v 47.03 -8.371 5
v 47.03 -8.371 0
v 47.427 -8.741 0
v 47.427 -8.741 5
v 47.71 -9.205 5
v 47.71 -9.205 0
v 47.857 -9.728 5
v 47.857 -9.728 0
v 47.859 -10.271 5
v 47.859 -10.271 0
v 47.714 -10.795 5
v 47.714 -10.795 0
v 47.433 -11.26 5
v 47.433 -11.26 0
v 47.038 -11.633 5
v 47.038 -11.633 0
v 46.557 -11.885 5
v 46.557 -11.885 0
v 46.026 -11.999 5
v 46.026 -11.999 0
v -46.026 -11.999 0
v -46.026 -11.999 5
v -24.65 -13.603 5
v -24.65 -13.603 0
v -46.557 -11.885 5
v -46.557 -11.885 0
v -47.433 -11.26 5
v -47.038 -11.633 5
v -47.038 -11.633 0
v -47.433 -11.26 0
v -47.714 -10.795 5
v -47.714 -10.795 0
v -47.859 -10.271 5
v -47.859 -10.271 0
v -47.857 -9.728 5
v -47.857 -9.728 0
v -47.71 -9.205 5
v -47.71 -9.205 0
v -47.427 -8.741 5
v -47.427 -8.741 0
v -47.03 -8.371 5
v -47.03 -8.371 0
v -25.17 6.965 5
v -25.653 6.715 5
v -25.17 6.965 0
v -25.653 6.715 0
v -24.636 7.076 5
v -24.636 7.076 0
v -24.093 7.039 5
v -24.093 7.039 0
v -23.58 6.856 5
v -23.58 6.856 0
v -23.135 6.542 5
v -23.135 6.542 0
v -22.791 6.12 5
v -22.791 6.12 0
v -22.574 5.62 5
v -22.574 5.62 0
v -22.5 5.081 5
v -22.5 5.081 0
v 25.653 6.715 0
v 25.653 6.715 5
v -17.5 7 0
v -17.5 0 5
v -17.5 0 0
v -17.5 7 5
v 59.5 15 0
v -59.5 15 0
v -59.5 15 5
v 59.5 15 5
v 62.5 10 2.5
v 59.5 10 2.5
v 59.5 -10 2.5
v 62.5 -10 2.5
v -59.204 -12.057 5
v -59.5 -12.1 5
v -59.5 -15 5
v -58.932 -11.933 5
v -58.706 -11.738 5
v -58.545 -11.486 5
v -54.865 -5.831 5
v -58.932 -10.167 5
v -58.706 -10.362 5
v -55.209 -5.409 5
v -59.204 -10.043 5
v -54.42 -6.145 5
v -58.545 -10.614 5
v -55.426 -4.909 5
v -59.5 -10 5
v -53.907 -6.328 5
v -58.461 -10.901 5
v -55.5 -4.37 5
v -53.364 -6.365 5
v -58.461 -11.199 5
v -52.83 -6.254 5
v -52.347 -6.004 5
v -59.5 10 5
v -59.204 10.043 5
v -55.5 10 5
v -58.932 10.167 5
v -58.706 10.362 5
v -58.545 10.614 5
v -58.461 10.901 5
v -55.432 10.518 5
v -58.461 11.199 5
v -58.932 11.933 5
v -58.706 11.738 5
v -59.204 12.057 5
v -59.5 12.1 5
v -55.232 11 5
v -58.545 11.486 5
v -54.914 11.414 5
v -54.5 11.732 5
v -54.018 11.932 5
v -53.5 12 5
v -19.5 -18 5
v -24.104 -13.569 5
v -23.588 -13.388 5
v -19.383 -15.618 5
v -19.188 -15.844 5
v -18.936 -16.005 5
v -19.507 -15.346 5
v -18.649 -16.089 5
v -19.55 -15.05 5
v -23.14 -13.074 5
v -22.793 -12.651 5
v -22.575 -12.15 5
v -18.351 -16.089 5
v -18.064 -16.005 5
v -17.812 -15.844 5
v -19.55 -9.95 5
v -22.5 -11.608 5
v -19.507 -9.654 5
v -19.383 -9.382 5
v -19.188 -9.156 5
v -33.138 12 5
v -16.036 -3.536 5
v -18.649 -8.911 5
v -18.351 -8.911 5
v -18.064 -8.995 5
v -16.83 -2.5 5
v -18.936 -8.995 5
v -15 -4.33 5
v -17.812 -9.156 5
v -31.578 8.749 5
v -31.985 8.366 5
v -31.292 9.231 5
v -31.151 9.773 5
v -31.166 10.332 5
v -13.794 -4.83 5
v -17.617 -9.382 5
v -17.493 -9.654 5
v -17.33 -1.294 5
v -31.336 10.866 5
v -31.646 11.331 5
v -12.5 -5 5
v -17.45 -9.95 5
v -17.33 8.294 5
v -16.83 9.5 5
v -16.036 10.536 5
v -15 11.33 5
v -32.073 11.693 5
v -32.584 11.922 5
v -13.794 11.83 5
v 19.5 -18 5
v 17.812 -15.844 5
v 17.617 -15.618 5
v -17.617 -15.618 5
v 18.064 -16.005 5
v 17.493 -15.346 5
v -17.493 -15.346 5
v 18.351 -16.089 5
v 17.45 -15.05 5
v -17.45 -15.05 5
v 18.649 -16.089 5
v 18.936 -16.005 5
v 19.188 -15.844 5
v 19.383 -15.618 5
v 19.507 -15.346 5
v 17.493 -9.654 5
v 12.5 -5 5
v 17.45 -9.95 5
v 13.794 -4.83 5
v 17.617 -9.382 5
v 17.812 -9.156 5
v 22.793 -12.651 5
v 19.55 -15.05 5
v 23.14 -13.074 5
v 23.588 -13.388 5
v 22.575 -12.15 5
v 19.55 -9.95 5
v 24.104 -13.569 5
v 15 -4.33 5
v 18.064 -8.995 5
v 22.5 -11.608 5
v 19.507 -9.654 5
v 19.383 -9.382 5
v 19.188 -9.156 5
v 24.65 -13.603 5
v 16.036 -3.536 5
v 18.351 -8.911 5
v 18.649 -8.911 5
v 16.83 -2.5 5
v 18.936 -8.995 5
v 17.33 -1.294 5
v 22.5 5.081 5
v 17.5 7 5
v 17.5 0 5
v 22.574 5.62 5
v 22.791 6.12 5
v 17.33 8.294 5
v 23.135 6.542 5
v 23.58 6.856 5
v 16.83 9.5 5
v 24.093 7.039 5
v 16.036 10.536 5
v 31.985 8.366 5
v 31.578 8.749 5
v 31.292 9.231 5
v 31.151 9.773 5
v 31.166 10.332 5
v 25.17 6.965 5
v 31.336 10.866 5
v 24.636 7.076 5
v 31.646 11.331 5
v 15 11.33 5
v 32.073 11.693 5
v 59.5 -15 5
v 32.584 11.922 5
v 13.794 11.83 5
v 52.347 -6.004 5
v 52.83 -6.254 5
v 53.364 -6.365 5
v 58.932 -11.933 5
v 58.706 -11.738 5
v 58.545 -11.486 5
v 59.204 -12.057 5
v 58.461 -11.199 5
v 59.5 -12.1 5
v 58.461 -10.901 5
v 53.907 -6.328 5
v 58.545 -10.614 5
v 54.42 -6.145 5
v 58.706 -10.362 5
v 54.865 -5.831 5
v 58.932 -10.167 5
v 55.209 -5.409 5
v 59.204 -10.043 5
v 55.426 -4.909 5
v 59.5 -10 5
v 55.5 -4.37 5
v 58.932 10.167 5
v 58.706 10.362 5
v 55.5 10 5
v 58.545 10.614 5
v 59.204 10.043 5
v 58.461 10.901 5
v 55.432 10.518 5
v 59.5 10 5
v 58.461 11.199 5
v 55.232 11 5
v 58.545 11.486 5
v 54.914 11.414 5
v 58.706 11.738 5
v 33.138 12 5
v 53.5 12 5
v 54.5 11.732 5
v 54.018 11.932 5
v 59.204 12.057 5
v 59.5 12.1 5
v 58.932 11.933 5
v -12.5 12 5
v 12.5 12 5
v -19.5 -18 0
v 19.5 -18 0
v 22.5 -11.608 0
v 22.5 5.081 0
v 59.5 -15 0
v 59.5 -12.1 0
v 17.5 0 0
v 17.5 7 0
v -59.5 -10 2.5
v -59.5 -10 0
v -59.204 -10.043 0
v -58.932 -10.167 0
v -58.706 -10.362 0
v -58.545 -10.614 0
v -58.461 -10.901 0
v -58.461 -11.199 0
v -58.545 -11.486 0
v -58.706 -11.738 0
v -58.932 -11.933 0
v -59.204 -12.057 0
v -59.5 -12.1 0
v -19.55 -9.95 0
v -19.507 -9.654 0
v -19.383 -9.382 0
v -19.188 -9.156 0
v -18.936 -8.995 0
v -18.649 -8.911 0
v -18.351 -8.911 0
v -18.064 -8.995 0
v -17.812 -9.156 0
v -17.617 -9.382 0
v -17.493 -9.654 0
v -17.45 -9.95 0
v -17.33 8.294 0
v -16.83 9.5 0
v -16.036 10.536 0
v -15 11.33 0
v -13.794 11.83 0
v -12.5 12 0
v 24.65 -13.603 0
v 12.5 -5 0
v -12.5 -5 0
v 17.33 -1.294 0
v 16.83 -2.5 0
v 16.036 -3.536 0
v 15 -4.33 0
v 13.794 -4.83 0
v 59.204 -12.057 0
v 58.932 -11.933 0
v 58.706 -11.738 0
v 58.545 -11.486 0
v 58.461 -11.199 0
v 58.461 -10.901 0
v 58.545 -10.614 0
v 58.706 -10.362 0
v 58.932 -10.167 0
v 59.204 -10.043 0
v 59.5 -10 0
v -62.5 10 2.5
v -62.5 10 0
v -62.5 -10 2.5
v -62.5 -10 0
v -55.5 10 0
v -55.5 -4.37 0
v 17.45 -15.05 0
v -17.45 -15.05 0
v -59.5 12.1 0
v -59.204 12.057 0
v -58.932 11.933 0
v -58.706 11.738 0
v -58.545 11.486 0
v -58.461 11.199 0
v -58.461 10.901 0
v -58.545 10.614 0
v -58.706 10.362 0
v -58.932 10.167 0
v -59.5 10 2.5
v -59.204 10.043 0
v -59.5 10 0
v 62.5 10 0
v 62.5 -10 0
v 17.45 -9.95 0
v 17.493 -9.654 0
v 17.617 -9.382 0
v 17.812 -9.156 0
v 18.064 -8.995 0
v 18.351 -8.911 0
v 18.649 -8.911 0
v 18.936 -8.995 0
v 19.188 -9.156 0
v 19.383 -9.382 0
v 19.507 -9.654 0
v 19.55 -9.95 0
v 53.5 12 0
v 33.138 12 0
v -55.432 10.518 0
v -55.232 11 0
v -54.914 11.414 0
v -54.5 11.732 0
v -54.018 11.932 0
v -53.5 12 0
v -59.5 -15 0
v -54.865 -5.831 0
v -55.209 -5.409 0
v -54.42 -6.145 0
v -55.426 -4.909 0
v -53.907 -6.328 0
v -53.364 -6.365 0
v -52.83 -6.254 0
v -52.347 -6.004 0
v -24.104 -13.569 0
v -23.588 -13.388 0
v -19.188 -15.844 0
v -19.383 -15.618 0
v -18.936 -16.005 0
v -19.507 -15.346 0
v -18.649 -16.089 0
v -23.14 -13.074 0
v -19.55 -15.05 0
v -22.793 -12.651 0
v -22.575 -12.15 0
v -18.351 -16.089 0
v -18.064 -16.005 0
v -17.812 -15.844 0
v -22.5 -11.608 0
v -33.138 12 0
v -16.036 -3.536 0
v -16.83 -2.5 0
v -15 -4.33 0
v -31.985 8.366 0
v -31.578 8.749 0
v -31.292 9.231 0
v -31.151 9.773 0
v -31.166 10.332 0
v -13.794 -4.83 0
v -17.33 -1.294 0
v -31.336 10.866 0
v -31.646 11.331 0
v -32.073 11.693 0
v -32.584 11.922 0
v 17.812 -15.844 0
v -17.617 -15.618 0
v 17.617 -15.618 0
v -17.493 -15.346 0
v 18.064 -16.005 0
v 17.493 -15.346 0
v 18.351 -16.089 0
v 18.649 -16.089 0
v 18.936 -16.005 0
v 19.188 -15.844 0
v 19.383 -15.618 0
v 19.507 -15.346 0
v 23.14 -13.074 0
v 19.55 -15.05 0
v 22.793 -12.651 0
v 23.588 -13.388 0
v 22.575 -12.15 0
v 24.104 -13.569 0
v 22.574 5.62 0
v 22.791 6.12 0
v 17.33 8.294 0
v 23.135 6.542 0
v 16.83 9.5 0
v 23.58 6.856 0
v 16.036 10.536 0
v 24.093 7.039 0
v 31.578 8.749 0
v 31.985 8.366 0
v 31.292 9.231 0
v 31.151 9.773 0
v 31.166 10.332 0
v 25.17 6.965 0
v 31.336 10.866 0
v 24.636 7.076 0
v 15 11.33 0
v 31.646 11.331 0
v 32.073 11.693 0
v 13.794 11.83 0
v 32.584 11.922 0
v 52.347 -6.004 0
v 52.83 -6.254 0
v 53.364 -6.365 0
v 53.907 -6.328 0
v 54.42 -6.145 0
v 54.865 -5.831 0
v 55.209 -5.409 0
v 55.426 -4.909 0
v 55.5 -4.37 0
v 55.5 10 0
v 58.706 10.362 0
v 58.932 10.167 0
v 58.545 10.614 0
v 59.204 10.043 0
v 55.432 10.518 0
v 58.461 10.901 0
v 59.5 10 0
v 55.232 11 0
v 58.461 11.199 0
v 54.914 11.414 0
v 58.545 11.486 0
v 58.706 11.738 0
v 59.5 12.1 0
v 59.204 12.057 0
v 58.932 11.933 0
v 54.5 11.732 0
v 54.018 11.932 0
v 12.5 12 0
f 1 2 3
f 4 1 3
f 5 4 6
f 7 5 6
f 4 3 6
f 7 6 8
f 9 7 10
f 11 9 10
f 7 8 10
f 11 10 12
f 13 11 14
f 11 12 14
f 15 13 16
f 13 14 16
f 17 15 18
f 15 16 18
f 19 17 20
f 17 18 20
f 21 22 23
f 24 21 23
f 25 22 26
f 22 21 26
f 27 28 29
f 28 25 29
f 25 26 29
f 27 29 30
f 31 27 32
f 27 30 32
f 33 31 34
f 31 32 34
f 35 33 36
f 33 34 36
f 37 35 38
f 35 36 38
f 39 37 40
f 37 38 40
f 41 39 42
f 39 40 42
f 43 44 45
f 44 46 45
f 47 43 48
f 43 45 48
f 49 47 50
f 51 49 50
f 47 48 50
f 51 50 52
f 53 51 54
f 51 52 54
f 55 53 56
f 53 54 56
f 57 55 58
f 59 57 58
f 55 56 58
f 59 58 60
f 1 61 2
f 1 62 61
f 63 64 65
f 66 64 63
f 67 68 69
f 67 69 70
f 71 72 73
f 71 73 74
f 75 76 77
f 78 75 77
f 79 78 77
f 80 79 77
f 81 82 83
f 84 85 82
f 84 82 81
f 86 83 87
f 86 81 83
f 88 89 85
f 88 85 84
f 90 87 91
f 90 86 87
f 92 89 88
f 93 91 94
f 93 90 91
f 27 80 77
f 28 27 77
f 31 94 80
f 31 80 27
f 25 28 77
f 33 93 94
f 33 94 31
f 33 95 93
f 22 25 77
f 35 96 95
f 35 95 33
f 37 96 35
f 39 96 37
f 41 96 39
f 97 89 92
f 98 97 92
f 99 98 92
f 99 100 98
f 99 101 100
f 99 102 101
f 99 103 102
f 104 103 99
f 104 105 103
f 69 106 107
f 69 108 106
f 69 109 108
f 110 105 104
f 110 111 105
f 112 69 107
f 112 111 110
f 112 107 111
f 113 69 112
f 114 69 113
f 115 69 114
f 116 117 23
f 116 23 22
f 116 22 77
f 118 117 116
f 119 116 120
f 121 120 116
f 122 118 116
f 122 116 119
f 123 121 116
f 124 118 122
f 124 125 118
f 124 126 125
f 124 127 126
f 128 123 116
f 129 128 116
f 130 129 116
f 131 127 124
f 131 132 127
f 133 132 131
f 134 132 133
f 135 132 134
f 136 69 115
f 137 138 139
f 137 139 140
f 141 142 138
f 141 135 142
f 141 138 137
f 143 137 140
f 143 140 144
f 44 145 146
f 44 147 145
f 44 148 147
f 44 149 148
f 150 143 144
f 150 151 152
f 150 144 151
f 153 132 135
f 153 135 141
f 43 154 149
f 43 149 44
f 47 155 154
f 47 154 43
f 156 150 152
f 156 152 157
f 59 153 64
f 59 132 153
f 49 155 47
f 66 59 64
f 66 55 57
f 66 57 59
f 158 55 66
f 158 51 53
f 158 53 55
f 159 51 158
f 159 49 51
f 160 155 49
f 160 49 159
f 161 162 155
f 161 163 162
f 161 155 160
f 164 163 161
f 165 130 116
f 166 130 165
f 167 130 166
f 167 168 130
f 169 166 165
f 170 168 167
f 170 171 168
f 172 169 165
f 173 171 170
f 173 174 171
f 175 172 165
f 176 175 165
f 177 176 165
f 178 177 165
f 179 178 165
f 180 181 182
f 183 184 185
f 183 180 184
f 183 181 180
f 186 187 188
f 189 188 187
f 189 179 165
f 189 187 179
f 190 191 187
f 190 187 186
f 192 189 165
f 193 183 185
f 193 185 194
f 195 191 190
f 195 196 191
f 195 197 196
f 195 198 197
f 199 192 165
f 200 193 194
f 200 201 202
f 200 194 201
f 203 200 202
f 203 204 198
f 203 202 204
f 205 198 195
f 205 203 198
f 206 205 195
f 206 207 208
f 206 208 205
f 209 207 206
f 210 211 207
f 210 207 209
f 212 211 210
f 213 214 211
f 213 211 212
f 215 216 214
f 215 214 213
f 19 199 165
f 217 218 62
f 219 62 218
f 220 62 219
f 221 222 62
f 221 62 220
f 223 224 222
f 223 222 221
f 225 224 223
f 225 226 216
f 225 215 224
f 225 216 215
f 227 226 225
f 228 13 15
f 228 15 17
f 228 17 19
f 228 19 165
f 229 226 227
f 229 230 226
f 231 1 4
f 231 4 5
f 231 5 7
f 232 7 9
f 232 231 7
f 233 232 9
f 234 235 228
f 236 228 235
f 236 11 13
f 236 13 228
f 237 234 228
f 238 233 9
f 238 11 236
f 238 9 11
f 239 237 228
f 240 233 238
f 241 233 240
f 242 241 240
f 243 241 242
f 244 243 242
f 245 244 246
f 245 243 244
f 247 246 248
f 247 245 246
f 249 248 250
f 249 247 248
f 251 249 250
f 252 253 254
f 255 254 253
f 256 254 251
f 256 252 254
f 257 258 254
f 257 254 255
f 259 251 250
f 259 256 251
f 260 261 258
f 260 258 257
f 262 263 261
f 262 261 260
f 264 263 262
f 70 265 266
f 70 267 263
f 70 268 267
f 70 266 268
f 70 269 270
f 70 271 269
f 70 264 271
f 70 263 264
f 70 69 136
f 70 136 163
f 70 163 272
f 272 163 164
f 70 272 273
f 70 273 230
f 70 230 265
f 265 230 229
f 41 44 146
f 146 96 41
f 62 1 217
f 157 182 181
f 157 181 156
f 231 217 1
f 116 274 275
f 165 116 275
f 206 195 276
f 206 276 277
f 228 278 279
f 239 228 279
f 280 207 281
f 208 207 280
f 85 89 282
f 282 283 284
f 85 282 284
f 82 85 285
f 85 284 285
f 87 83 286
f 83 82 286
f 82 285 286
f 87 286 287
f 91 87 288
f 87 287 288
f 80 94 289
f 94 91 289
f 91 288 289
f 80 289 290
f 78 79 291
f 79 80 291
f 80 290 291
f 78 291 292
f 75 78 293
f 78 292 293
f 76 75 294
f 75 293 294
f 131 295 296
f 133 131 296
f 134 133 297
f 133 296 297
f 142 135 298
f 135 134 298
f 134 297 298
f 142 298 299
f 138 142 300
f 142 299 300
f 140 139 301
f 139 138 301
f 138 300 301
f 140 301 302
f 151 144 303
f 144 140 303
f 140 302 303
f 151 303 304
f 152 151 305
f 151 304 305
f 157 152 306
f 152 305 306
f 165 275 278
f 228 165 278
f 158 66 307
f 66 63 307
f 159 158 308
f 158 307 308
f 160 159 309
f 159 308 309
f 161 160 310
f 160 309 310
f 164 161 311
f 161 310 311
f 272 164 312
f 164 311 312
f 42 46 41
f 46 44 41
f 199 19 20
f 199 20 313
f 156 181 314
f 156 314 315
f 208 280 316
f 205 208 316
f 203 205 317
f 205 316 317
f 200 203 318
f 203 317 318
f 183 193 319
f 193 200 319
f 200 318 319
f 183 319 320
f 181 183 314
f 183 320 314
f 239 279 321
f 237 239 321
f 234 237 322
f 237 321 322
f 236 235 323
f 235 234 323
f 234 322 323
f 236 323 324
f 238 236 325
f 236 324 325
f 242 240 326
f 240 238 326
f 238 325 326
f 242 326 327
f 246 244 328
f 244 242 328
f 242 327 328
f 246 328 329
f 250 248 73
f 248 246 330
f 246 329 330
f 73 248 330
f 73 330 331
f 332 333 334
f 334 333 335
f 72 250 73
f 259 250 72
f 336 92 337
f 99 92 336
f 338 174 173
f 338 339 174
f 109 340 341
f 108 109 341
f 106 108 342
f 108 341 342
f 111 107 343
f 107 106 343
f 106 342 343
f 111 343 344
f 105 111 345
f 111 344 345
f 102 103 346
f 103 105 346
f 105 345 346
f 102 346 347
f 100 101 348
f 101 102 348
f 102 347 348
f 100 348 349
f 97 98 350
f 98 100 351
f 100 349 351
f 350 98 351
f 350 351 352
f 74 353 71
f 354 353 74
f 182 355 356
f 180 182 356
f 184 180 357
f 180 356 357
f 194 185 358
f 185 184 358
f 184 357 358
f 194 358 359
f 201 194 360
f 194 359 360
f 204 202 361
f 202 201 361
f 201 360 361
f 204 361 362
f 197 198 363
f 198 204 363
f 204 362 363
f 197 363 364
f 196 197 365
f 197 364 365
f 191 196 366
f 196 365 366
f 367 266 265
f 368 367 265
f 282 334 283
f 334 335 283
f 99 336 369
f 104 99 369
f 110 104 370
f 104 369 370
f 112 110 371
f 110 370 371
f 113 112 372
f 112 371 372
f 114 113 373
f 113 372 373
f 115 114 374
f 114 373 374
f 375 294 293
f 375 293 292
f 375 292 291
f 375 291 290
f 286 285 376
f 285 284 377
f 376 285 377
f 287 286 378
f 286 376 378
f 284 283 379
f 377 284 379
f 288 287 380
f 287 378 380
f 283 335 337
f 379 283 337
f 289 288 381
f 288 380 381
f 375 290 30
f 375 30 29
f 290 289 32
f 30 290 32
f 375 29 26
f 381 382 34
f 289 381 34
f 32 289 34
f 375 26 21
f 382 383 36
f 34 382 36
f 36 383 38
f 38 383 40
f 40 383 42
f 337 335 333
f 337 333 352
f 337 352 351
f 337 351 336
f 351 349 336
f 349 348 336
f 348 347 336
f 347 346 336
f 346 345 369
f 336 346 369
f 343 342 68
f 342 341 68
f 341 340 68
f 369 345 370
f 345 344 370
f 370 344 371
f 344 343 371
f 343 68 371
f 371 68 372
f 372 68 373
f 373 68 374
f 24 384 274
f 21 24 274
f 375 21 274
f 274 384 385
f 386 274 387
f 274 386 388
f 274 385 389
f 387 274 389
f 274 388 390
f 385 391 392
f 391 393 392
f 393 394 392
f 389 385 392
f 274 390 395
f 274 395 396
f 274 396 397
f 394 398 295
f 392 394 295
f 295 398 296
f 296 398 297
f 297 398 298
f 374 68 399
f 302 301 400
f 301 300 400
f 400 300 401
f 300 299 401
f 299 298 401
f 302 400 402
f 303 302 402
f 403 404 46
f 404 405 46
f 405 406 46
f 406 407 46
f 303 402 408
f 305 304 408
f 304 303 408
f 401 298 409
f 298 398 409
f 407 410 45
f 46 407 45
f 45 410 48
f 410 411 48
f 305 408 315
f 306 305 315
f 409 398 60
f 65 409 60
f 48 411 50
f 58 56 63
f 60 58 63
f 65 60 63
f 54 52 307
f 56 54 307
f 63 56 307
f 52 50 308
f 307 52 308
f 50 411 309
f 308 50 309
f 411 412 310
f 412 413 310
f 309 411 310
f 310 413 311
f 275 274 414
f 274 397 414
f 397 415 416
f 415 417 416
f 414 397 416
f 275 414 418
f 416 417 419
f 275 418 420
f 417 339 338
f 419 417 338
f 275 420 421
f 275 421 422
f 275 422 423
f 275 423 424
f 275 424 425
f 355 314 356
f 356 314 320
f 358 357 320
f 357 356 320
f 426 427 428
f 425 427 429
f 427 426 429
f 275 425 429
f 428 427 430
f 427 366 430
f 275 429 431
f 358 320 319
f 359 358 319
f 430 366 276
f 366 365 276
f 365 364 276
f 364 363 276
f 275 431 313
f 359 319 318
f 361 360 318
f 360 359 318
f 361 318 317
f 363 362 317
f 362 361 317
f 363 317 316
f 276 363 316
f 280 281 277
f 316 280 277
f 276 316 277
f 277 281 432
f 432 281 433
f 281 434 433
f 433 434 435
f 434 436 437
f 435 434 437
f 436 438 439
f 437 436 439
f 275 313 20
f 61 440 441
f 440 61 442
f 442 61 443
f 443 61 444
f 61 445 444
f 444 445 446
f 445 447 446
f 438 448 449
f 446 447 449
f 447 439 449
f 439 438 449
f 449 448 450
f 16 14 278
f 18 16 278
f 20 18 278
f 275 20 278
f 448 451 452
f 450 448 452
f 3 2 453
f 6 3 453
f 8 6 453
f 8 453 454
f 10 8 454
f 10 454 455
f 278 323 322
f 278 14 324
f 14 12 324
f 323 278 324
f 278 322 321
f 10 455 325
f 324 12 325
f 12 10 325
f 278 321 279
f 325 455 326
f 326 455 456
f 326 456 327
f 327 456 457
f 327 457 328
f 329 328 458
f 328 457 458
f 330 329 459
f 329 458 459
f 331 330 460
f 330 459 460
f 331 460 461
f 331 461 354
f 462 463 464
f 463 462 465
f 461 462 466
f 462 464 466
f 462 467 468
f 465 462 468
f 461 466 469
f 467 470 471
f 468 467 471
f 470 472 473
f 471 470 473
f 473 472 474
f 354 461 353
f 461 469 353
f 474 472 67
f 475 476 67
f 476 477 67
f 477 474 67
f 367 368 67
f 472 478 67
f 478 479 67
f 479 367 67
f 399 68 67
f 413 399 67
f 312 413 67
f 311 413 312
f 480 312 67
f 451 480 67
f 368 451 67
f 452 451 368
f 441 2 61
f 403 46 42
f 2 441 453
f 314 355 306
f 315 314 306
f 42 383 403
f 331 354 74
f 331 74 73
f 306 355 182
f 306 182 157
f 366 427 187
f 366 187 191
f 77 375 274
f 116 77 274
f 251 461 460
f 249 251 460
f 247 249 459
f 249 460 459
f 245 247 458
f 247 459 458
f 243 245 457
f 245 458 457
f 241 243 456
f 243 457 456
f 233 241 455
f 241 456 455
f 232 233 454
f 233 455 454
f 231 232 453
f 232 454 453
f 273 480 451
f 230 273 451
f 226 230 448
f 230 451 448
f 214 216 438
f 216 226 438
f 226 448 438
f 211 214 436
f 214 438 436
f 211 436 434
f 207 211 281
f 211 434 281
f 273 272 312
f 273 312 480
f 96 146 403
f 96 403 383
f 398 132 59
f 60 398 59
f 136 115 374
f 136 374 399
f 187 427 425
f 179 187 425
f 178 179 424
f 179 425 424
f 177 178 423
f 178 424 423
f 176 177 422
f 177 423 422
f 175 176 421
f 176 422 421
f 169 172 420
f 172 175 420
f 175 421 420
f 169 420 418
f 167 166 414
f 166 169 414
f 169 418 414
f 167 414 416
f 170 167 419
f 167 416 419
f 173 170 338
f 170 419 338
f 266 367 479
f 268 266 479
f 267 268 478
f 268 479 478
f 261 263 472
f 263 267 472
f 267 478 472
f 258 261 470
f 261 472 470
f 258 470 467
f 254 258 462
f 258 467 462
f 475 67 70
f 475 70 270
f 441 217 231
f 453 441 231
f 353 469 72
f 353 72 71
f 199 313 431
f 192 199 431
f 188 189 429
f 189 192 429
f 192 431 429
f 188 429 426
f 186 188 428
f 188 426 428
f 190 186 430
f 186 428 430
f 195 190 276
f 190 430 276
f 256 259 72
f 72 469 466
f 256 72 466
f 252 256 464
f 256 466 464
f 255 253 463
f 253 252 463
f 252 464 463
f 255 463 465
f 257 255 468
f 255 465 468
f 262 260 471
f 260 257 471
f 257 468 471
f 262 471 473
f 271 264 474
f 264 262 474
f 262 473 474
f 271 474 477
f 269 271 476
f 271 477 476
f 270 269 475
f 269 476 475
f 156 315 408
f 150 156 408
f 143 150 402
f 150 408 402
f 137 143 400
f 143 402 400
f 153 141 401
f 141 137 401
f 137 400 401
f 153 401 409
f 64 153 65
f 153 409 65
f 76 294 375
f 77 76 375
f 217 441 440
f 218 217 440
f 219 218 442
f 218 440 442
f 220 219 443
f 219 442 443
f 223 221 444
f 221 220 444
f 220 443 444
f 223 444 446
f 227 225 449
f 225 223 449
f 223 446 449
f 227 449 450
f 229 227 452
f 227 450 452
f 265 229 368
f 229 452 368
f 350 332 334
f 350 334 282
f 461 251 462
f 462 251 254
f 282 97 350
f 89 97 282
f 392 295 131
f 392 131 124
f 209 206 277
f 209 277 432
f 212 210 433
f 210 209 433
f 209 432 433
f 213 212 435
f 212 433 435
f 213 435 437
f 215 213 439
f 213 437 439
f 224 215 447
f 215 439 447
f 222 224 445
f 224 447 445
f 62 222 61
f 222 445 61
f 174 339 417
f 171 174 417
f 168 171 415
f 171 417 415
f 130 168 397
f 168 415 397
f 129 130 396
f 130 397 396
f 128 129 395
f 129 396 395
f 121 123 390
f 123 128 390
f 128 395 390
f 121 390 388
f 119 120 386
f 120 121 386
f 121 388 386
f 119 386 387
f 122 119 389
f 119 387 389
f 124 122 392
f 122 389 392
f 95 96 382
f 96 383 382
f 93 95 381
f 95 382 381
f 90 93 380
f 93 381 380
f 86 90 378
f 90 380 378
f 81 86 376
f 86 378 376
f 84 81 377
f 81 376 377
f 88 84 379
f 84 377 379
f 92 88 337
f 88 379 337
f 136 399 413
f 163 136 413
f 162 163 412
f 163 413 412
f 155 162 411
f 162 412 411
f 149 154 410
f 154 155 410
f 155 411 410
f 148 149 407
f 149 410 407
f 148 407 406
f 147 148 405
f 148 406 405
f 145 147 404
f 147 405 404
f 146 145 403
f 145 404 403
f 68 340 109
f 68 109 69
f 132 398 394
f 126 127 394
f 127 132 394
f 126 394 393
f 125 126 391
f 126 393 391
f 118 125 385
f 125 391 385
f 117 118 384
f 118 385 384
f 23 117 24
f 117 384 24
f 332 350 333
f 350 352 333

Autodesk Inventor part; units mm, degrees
ref_plane "YZ Plane" through (0, 0, 0) normal (1, 0, 0) x (0, 1, 0)
ref_plane "XZ Plane" through (0, 0, 0) normal (0, 1, 0) x (-1, 0, 0)
ref_plane "XY Plane" through (0, 0, 0) normal (0, 0, 1) x (1, 0, 0)
sketch "スケッチ1" plane through (0, 0, 0) normal (0, 0, 1) x (1, 0, 0)
  line L0 (-59.5, -15) -> (59.5, -15) construction
  line L1 (59.5, -15) -> (59.5, 15) construction
  line L2 (59.5, 15) -> (-59.5, 15) construction
  line L3 (-59.5, 15) -> (-59.5, -15) construction
  line L4 (-59.5, -15) -> (59.5, 15) construction
  line L5 (59.5, -15) -> (-59.5, 15) construction
  line L6 (-59.5, 12.1) -> (-59.5, 15)
  line L7 (-59.5, 15) -> (59.5, 15)
  line L8 (59.5, 15) -> (59.5, 12.1)
  line L9 (-59.5, -12.1) -> (-59.5, -15)
  line L10 (59.5, -15) -> (59.5, -12.1)
  line L11 (-59.5, 10) -> (-62.5, 10)
  line L12 (-62.5, 10) -> (-62.5, -10)
  line L13 (-62.5, -10) -> (-59.5, -10)
  arc A0 (-59.5, 10) -> (-59.5, 12.1) centre (-59.5, 11.05) ccw
  line L14 (0, 0) -> (0, 15) construction
  line L15 (0, 0) -> (-59.5, 0) construction
  arc A1 (-59.5, -12.1) -> (-59.5, -10) centre (-59.5, -11.05) ccw
  line L16 (59.5, 10) -> (62.5, 10)
  line L17 (62.5, 10) -> (62.5, -10)
  line L18 (62.5, -10) -> (59.5, -10)
  arc A2 (59.5, 12.1) -> (59.5, 10) centre (59.5, 11.05) ccw
  arc A3 (59.5, -10) -> (59.5, -12.1) centre (59.5, -11.05) ccw
  line L19 (-59.5, -15) -> (-19.5, -18)
  line L20 (-19.5, -18) -> (19.5, -18)
  line L21 (19.5, -18) -> (59.5, -15)
  line L22 (-19.5, -10) -> (19.5, -10) construction
  line L23 (19.5, -10) -> (19.5, -15) construction
  line L24 (19.5, -15) -> (-19.5, -15) construction
  line L25 (-19.5, -15) -> (-19.5, -10) construction
  line L26 (19.55, -9.95) -> (-19.55, -9.95)
  line L27 (-19.55, -9.95) -> (-19.55, -15.05)
  line L28 (-19.55, -15.05) -> (19.55, -15.05)
  line L29 (19.55, -15.05) -> (19.55, -9.95)
  circle A4 centre (-18.5, -9.95) radius 1.05
  circle A5 centre (-18.5, -15.05) radius 1.05
  circle A6 centre (18.5, -9.95) radius 1.05
  circle A7 centre (18.5, -15.05) radius 1.05
  dimension "d9" = 2.1
  dimension "d0" = 119
  dimension "d1" = 30
  dimension "d2" = 1.05
  dimension "d3" = 20
  dimension "d4" = 3
  dimension "d5" = 5
  dimension "d6" = 0.05
  dimension "d7" = 39
  dimension "d8" = 3
extrude "押し出し1" add sketch "スケッチ1" along normal blind 5
sketch "スケッチ2" plane through (0, 0, 5) normal (0, 0, 1) x (1, 0, 0)
  line L0 (59.5, 12.1) -> (59.5, 15) projected
  line L1 (-59.5, 15) -> (-59.5, 12.1) projected
  line L2 (65.6261, 13.972) -> (59.5, 13.972)
  line L3 (59.5, 13.972) -> (59.5, -16.1)
  line L4 (59.5, -16.1) -> (65.6261, -16.1)
  line L5 (65.6261, -16.1) -> (65.6261, 13.972)
  line L6 (-65.8886, -16.1) -> (-59.5, -16.1)
  line L7 (-59.5, -16.1) -> (-59.5, 18.3327)
  line L8 (-59.5, 18.3327) -> (-65.8886, 18.3327)
  line L9 (-65.8886, 18.3327) -> (-65.8886, -16.1)
  point P0 (0, 0)
extrude "押し出し2" cut sketch "スケッチ2" against normal blind 2.5
sketch "スケッチ8" plane through (0, 0, 5) normal (0, 0, 1) x (1, 0, 0)
  line L0 (59.5, 15) -> (-59.5, 15) projected
  line L1 (-59.5, 10) -> (-59.5, -10) projected
  line L2 (-59.5, -15) -> (-19.5, -18) projected
  line L3 (17.45, -15.05) -> (-17.45, -15.05) projected
  arc A0 (-19.55, -15.05) -> (-17.45, -15.05) centre (-18.5, -15.05) ccw projected
  line L4 (-19.55, -15.05) -> (-19.55, -9.95) projected
  arc A1 (-17.45, -9.95) -> (-19.55, -9.95) centre (-18.5, -9.95) ccw projected
  line L5 (-17.45, -9.95) -> (17.45, -9.95) projected
  arc A2 (19.55, -9.95) -> (17.45, -9.95) centre (18.5, -9.95) ccw projected
  line L6 (19.55, -9.95) -> (19.55, -15.05) projected
  arc A3 (17.45, -15.05) -> (19.55, -15.05) centre (18.5, -15.05) ccw projected
  line L7 (-55.5, 12) -> (-22.5, 12) construction
  line L8 (-22.5, 12) -> (-22.5, -13.7638) construction
  line L9 (-22.5, -13.7638) -> (-55.5, -11.2888) construction
  line L10 (-55.5, -11.2888) -> (-55.5, 12) construction
  line L11 (17.5013, -10) -> (-17.5013, -10) construction
  arc A4 (-17.5013, -10) -> (-19.5, -9.95) centre (-18.5, -9.95) ccw construction
  line L12 (-19.5, -9.95) -> (-19.5, -15.05) construction
  arc A5 (-19.5, -15.05) -> (-17.5013, -15) centre (-18.5, -15.05) ccw construction
  line L13 (-17.5013, -15) -> (17.5013, -15) construction
  arc A6 (17.5013, -15) -> (19.5, -15.05) centre (18.5, -15.05) ccw construction
  line L14 (19.5, -15.05) -> (19.5, -9.95) construction
  arc A7 (19.5, -9.95) -> (17.5013, -10) centre (18.5, -9.95) ccw construction
  line L15 (-17.5, 12) -> (17.5, 12)
  line L16 (17.5, 12) -> (17.5, -5)
  line L17 (17.5, -5) -> (-17.5, -5)
  line L18 (-17.5, -5) -> (-17.5, 12)
  line L19 (0, 0) -> (0, 15) construction
  line L20 (-22.5, 12) -> (-55.5, -11.2888) construction
  line L21 (-55.5, 12) -> (-26.8358, 12)
  line L22 (-26.8358, 12) -> (-55.5, -8.2289)
  line L23 (-55.5, -8.2289) -> (-55.5, 12)
  line L24 (-51.5807, -11.5827) -> (-22.5, -13.7638)
  line L25 (-22.5, -13.7638) -> (-22.5, 8.9401)
  line L26 (-22.5, 8.9401) -> (-51.5807, -11.5827)
  line L27 (55.5, 12) -> (22.5, 12) construction
  line L28 (22.5, 12) -> (22.5, -13.7638) construction
  line L29 (22.5, -13.7638) -> (55.5, -11.2888) construction
  line L30 (55.5, -11.2888) -> (55.5, 12) construction
  line L31 (22.5, 12) -> (55.5, -11.2888) construction
  line L32 (55.5, 12) -> (26.8358, 12)
  line L33 (26.8358, 12) -> (55.5, -8.2289)
  line L34 (55.5, -8.2289) -> (55.5, 12)
  line L35 (51.5807, -11.5827) -> (22.5, -13.7638)
  line L36 (22.5, -13.7638) -> (22.5, 8.9401)
  line L37 (22.5, 8.9401) -> (51.5807, -11.5827)
  dimension "d51" = 4
  dimension "d52" = 3
  dimension "d53" = 0.05
  dimension "d54" = 3
  dimension "d55" = 4
  dimension "d56" = 5
  dimension "d57" = 5
  dimension "d58" = 5
extrude "押し出し6" cut sketch "スケッチ8" against normal blind 10 contours L15 L16 L17 L18 | L21 L22 L23 | L26 L25 L24 | L34 L33 L32 | L35 L36 L37
fillet "フィレット4" radius 2 12 edges at (-55.5, 12, 2.5) (-55.5, -8.2289, 2.5) (-26.8358, 12, 2.5) (-22.5, 8.9401, 2.5) (-51.5807, -11.5827, 2.5) (-22.5, -13.7638, 2.5) (22.5, 8.9401, 2.5) (26.8358, 12, 2.5) (55.5, -8.2289, 2.5) (55.5, 12, 2.5) (22.5, -13.7638, 2.5) (51.5807, -11.5827, 2.5)
fillet "フィレット4" radius 5 4 edges at (-17.5, -5, 2.5) (-17.5, 12, 2.5) (17.5, 12, 2.5) (17.5, -5, 2.5)
properties part number "コックピット_サブフレーム_1_6" material "アセタール樹脂、黒"
